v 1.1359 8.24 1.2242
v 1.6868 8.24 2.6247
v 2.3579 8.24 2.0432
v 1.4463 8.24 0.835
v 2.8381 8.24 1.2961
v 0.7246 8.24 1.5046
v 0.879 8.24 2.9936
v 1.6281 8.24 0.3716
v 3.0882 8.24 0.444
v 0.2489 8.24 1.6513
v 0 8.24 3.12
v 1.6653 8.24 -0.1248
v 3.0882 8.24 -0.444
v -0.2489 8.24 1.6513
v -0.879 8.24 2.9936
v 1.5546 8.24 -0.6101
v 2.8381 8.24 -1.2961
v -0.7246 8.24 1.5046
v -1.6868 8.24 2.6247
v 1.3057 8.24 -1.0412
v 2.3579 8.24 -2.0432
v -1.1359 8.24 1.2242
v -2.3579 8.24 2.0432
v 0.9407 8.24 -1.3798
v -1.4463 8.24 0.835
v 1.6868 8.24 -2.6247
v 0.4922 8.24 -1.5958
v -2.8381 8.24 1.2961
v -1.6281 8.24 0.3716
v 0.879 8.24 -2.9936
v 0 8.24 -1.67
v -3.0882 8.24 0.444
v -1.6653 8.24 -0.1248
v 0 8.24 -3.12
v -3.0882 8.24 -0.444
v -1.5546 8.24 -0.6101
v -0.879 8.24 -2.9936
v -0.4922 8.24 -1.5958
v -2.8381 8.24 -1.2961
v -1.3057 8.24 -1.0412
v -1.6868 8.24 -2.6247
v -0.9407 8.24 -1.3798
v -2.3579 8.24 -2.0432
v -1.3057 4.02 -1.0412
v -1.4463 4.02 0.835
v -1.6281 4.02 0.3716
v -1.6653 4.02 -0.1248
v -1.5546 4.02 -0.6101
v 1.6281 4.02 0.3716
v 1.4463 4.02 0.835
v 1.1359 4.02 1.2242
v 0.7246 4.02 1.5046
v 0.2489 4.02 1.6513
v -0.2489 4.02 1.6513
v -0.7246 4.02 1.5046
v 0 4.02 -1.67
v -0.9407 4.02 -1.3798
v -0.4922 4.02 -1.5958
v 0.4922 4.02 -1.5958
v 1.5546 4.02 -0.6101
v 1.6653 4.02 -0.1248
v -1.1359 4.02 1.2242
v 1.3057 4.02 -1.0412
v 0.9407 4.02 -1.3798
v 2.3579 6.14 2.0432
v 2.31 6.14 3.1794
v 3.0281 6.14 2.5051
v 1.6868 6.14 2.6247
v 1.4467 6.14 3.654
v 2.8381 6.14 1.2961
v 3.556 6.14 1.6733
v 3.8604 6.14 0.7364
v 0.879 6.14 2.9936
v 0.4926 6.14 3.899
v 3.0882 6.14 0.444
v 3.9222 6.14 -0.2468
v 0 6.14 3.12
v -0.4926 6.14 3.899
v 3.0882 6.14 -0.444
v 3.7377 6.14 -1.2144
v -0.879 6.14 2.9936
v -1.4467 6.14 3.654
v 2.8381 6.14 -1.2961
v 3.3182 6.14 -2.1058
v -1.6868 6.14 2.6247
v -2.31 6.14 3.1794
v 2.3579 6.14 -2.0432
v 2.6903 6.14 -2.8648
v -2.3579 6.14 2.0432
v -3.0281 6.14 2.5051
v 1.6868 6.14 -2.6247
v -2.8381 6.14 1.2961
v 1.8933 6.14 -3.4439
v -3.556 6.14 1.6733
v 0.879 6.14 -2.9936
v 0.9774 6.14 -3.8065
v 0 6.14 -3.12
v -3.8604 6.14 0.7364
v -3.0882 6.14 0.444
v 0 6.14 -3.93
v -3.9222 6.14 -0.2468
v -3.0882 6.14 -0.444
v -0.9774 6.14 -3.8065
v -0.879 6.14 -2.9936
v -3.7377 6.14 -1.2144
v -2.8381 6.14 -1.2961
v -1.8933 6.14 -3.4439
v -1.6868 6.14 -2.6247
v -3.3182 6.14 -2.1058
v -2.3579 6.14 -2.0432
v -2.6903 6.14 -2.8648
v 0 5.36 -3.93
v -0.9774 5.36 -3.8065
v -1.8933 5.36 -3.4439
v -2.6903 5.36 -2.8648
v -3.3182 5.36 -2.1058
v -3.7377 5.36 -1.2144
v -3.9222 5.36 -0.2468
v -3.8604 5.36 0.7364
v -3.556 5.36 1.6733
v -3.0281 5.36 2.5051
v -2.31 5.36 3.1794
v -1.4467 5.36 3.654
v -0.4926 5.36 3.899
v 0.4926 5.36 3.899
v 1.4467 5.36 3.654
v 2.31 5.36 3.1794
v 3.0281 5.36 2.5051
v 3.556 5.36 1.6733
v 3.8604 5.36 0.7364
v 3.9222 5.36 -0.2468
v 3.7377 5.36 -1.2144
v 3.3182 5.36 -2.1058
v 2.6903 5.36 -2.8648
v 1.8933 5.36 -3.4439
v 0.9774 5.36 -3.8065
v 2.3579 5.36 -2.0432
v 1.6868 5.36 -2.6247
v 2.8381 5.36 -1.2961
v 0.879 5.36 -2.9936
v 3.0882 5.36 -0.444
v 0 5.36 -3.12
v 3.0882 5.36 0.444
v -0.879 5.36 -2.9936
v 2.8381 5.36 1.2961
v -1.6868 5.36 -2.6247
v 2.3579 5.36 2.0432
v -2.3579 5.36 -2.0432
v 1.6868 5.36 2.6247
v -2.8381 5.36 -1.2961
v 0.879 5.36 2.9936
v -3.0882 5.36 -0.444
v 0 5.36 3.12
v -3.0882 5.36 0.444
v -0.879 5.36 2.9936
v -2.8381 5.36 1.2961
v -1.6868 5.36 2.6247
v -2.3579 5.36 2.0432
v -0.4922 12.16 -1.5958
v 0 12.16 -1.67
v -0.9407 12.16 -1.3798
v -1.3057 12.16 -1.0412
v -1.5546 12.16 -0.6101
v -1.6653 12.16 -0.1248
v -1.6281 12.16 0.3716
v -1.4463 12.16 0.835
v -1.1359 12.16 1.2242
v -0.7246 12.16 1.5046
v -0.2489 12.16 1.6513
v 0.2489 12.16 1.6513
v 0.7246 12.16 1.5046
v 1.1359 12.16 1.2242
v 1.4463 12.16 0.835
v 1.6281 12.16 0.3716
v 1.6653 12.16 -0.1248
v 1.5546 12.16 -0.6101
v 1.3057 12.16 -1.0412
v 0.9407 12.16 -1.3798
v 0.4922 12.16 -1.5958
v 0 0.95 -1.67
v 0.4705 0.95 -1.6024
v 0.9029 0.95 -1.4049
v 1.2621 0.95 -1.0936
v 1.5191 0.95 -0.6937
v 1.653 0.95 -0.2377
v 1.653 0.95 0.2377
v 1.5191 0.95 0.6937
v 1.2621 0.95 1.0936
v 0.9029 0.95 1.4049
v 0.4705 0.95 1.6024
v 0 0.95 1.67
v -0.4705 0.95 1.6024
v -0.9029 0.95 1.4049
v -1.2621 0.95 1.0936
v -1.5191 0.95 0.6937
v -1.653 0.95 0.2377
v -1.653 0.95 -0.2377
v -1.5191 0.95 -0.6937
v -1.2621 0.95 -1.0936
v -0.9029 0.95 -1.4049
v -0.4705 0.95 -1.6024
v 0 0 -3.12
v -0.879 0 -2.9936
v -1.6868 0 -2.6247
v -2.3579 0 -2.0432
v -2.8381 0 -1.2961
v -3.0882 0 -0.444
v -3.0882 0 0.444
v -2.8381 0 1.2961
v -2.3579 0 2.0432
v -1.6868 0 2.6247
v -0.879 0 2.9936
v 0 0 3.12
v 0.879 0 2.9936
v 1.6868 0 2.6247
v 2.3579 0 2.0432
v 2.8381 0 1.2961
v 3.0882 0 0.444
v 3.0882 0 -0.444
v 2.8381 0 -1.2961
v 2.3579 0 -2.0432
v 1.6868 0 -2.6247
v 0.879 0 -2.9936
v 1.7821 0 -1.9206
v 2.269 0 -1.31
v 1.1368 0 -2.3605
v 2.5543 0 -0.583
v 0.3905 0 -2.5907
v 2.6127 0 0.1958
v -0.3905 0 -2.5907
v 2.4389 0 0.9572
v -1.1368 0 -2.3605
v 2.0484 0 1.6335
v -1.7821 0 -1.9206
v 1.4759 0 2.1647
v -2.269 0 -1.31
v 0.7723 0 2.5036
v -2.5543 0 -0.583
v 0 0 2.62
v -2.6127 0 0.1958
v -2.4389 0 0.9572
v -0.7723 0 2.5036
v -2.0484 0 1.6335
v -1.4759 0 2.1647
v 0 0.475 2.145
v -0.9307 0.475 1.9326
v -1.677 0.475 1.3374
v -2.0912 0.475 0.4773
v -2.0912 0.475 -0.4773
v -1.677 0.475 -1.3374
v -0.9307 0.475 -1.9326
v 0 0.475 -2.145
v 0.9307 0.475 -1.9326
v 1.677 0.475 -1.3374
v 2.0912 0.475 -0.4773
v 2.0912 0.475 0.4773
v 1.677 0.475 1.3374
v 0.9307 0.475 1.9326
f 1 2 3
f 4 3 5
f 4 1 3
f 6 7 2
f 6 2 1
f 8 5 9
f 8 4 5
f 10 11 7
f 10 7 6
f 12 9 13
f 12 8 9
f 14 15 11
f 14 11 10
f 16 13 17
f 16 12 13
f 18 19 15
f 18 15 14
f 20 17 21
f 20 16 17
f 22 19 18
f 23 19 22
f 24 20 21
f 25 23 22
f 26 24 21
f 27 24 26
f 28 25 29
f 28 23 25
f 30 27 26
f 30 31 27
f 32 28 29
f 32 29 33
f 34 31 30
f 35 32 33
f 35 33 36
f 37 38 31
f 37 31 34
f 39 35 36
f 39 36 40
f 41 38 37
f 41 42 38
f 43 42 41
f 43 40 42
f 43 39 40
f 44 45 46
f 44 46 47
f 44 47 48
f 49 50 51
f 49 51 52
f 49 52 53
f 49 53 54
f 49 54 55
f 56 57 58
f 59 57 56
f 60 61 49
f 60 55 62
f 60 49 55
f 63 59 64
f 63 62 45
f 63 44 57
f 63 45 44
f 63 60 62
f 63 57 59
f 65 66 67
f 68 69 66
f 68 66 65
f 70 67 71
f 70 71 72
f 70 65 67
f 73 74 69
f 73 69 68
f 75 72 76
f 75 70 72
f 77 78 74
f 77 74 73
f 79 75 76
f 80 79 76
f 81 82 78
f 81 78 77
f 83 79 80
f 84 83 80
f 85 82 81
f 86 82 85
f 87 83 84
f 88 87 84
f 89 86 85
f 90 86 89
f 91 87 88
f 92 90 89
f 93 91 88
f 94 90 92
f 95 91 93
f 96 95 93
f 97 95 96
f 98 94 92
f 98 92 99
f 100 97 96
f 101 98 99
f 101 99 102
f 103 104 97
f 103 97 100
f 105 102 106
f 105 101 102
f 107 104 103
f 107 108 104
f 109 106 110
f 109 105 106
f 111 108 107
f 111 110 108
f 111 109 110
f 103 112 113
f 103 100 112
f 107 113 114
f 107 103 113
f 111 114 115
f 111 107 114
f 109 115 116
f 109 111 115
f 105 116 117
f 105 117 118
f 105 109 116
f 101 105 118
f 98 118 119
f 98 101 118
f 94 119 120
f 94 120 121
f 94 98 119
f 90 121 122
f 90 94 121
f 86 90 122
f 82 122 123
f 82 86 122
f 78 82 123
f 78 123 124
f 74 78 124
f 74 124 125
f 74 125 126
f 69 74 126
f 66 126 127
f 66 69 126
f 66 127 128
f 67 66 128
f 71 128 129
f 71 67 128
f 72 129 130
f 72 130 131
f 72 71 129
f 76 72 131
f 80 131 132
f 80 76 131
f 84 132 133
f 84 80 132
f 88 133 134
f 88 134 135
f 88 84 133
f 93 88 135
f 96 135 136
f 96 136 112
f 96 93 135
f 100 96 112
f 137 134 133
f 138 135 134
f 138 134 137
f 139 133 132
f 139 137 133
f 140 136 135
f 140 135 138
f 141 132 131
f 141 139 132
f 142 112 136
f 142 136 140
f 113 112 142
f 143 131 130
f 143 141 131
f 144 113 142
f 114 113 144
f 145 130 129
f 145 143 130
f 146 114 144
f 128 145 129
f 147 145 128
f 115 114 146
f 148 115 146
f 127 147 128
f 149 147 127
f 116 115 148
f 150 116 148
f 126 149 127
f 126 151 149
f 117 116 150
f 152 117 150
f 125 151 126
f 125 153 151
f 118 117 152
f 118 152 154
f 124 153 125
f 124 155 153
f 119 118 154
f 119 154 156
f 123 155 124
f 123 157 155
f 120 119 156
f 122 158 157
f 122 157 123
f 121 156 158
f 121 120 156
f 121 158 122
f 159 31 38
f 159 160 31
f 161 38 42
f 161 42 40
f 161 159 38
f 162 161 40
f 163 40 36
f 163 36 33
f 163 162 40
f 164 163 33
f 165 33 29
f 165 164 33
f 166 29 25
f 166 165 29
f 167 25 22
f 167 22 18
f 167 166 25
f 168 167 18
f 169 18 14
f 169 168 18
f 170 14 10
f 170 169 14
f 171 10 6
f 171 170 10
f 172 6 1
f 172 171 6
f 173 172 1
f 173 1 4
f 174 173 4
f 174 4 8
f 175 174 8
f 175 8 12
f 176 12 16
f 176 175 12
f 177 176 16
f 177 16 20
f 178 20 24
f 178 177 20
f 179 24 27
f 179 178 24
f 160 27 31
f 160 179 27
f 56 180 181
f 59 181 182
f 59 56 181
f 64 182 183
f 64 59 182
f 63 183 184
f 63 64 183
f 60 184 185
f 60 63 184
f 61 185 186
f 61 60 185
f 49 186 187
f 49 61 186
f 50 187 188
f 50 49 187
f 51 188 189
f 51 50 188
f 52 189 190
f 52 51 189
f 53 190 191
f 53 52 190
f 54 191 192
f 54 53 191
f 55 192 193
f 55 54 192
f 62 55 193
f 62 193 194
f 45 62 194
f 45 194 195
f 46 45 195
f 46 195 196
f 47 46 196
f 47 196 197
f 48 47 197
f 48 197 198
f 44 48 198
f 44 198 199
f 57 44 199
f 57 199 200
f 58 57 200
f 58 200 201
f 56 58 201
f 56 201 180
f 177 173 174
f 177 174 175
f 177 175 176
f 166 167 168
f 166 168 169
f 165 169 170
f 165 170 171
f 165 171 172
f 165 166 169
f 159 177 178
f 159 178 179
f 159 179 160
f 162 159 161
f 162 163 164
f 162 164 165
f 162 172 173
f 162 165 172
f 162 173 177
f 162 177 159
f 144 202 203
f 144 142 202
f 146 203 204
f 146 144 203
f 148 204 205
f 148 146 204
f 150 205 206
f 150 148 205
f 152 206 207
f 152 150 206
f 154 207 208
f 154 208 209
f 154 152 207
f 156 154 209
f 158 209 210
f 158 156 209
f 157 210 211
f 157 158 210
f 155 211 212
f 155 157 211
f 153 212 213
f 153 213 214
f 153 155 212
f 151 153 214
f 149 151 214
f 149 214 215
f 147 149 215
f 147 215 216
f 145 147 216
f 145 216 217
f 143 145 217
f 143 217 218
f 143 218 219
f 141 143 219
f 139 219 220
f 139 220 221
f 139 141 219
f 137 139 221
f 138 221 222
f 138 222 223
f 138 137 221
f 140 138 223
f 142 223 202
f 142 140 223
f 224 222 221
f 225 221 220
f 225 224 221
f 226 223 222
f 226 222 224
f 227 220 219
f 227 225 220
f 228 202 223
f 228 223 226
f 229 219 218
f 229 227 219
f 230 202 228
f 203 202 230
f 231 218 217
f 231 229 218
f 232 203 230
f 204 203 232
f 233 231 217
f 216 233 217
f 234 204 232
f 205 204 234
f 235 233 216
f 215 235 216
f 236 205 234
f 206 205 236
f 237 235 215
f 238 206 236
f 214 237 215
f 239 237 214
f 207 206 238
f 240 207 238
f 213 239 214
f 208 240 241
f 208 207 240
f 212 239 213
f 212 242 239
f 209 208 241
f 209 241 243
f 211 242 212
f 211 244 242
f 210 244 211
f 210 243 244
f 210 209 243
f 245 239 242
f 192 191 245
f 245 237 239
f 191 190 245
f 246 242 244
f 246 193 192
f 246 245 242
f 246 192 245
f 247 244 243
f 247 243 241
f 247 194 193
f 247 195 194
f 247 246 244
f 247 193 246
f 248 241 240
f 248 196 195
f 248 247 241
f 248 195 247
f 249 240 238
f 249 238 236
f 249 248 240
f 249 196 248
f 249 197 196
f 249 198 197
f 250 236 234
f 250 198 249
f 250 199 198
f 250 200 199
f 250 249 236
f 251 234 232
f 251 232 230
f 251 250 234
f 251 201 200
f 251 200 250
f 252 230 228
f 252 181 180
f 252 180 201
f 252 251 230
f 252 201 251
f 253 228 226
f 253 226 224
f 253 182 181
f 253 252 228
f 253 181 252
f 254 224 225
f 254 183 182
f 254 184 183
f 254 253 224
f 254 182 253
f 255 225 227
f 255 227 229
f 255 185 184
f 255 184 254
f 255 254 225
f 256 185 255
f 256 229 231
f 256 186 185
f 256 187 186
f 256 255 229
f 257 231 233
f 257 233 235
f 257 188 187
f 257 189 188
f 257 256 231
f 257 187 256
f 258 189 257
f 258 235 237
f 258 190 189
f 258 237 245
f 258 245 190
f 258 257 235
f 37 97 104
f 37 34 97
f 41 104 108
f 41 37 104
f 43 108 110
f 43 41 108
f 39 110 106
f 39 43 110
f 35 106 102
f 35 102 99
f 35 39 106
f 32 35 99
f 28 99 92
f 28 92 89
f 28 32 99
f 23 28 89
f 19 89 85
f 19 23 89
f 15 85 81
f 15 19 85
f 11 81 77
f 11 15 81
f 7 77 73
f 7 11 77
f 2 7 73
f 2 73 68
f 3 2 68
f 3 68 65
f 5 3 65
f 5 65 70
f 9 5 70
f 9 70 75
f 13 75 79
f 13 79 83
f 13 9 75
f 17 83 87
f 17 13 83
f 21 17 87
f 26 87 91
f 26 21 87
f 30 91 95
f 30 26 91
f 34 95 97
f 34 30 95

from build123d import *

# Parameters (mm, degrees)
CUT_EXTRUDE_START   = -4.02
SKETCH_2_R          = 1.67
CUT_EXTRUDE_1_DEPTH = 4.02


with BuildPart() as part:
    # 草图1 → 旋转1 (revolve)
    with BuildSketch(Plane.XY, mode=Mode.PRIVATE) as revolve_1_sk:
        Polygon((0, 0), (3.12, 0), (3.12, 5.36), (3.93, 5.36), (3.93, 6.14), (3.12, 6.14), (3.12, 8.24), (1.67, 8.24), (1.67, 12.16), (0, 12.16), align=None)
    revolve(revolve_1_sk.sketch.rotate(Axis((0, 0, 0), (0, 1, 0)), 90), axis=Axis((0, 0, 0), (0, 1, 0)))

    # 草图2 → 切除-拉伸1 (cut)
    with BuildSketch(Plane.XZ.offset(CUT_EXTRUDE_START)):
        with Locations(Location((0, 0, 0), (0, 0, 270))):
            Circle(SKETCH_2_R)
    extrude(amount=CUT_EXTRUDE_1_DEPTH, mode=Mode.SUBTRACT)

    # 草图3 → 切除-旋转1 (revolve, cut)
    with BuildSketch(Plane.XY, mode=Mode.PRIVATE) as cut_revolve_1_sk:
        Polygon((2.62, 0), (1.67, 0.95), (0, 0.95), (0, 0), align=None)
    revolve(cut_revolve_1_sk.sketch.rotate(Axis((0, 0, 0), (0, -1, 0)), 90), axis=Axis((0, 0, 0), (0, -1, 0)), mode=Mode.SUBTRACT)


solid = part.part
